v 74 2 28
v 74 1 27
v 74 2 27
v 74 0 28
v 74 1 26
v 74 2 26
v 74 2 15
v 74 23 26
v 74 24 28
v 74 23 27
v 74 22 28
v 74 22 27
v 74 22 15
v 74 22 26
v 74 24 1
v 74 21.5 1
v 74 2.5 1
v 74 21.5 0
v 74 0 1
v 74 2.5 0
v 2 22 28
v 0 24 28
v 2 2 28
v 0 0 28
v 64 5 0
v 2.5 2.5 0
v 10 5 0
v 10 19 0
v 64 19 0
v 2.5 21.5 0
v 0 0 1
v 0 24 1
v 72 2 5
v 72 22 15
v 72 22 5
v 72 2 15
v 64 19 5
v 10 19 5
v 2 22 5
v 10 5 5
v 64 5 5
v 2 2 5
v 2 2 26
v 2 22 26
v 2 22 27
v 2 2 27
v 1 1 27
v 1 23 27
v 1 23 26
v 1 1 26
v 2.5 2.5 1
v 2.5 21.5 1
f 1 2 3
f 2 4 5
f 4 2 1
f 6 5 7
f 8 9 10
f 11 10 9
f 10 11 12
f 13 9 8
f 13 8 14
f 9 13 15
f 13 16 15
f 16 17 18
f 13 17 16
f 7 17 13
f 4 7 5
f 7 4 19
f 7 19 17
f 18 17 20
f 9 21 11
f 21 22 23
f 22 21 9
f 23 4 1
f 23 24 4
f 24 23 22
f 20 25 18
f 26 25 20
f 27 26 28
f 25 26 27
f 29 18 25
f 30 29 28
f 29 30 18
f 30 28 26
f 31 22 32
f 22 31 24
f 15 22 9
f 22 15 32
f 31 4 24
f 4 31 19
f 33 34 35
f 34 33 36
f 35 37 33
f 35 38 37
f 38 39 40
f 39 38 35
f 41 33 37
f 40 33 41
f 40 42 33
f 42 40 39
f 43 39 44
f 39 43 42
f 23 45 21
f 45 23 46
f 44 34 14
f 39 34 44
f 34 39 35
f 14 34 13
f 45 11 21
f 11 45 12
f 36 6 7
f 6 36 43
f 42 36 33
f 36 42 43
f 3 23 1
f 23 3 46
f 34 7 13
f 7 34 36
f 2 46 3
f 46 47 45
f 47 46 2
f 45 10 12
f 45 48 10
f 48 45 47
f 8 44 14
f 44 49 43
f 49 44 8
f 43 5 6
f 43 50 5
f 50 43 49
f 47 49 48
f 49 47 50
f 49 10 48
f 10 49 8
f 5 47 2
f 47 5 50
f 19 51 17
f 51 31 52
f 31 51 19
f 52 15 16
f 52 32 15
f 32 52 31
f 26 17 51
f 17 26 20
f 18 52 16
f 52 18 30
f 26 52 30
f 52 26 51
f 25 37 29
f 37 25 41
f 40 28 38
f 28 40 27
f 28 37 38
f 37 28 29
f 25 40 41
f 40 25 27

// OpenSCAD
// Parameter für die innere Box
inner_length = 70;  // Länge der inneren Box (7cm)
inner_width = 20;   // Breite der inneren Box (2cm)
inner_height = 23;  // Höhe der inneren Box (2.3cm)
wall_thickness = 2;  // Wandstärke
bottom_thickness = 5; // Dicke des unteren Randes

// Berechnete äußere Dimensionen
outer_length = inner_length + 2 * wall_thickness;
outer_width = inner_width + 2 * wall_thickness;
outer_height = inner_height + bottom_thickness;

// Funktion, um ein Kästchen zu generieren
module box() {
    difference(){
        difference() {
            // Äußere Box
            cube([outer_length, outer_width, outer_height], center = false);
            
            // Innere Box (Subtrahiert von der äußeren Box)
            translate([wall_thickness, wall_thickness, bottom_thickness])
                cube([inner_length, inner_width, inner_height+5], center = false);
        }
        //Aussparung für USB
        translate([wall_thickness, wall_thickness, bottom_thickness+10])
                cube([inner_length+10, inner_width, inner_height], center = false);
        //Aussparung für Deckel
        translate([1, 1, outer_height-2])
            cube([outer_length-1, outer_width-2, 1], center = false);
        //Aussparung links und rechts unten
        cube([outer_length, 2.5, 1], center = false);
        translate([0, outer_width-2.5, 0])
            cube([outer_length, 2.5, 1], center = false);
        cube([2.5,outer_width, 1], center = false);
        //Ausparung für Drähte
        translate([10, 5, 0])
            cube([outer_length-20, outer_width-10, bottom_thickness], center = false);
        
        
    }
        
}


// Aufruf der Funktion
box();
